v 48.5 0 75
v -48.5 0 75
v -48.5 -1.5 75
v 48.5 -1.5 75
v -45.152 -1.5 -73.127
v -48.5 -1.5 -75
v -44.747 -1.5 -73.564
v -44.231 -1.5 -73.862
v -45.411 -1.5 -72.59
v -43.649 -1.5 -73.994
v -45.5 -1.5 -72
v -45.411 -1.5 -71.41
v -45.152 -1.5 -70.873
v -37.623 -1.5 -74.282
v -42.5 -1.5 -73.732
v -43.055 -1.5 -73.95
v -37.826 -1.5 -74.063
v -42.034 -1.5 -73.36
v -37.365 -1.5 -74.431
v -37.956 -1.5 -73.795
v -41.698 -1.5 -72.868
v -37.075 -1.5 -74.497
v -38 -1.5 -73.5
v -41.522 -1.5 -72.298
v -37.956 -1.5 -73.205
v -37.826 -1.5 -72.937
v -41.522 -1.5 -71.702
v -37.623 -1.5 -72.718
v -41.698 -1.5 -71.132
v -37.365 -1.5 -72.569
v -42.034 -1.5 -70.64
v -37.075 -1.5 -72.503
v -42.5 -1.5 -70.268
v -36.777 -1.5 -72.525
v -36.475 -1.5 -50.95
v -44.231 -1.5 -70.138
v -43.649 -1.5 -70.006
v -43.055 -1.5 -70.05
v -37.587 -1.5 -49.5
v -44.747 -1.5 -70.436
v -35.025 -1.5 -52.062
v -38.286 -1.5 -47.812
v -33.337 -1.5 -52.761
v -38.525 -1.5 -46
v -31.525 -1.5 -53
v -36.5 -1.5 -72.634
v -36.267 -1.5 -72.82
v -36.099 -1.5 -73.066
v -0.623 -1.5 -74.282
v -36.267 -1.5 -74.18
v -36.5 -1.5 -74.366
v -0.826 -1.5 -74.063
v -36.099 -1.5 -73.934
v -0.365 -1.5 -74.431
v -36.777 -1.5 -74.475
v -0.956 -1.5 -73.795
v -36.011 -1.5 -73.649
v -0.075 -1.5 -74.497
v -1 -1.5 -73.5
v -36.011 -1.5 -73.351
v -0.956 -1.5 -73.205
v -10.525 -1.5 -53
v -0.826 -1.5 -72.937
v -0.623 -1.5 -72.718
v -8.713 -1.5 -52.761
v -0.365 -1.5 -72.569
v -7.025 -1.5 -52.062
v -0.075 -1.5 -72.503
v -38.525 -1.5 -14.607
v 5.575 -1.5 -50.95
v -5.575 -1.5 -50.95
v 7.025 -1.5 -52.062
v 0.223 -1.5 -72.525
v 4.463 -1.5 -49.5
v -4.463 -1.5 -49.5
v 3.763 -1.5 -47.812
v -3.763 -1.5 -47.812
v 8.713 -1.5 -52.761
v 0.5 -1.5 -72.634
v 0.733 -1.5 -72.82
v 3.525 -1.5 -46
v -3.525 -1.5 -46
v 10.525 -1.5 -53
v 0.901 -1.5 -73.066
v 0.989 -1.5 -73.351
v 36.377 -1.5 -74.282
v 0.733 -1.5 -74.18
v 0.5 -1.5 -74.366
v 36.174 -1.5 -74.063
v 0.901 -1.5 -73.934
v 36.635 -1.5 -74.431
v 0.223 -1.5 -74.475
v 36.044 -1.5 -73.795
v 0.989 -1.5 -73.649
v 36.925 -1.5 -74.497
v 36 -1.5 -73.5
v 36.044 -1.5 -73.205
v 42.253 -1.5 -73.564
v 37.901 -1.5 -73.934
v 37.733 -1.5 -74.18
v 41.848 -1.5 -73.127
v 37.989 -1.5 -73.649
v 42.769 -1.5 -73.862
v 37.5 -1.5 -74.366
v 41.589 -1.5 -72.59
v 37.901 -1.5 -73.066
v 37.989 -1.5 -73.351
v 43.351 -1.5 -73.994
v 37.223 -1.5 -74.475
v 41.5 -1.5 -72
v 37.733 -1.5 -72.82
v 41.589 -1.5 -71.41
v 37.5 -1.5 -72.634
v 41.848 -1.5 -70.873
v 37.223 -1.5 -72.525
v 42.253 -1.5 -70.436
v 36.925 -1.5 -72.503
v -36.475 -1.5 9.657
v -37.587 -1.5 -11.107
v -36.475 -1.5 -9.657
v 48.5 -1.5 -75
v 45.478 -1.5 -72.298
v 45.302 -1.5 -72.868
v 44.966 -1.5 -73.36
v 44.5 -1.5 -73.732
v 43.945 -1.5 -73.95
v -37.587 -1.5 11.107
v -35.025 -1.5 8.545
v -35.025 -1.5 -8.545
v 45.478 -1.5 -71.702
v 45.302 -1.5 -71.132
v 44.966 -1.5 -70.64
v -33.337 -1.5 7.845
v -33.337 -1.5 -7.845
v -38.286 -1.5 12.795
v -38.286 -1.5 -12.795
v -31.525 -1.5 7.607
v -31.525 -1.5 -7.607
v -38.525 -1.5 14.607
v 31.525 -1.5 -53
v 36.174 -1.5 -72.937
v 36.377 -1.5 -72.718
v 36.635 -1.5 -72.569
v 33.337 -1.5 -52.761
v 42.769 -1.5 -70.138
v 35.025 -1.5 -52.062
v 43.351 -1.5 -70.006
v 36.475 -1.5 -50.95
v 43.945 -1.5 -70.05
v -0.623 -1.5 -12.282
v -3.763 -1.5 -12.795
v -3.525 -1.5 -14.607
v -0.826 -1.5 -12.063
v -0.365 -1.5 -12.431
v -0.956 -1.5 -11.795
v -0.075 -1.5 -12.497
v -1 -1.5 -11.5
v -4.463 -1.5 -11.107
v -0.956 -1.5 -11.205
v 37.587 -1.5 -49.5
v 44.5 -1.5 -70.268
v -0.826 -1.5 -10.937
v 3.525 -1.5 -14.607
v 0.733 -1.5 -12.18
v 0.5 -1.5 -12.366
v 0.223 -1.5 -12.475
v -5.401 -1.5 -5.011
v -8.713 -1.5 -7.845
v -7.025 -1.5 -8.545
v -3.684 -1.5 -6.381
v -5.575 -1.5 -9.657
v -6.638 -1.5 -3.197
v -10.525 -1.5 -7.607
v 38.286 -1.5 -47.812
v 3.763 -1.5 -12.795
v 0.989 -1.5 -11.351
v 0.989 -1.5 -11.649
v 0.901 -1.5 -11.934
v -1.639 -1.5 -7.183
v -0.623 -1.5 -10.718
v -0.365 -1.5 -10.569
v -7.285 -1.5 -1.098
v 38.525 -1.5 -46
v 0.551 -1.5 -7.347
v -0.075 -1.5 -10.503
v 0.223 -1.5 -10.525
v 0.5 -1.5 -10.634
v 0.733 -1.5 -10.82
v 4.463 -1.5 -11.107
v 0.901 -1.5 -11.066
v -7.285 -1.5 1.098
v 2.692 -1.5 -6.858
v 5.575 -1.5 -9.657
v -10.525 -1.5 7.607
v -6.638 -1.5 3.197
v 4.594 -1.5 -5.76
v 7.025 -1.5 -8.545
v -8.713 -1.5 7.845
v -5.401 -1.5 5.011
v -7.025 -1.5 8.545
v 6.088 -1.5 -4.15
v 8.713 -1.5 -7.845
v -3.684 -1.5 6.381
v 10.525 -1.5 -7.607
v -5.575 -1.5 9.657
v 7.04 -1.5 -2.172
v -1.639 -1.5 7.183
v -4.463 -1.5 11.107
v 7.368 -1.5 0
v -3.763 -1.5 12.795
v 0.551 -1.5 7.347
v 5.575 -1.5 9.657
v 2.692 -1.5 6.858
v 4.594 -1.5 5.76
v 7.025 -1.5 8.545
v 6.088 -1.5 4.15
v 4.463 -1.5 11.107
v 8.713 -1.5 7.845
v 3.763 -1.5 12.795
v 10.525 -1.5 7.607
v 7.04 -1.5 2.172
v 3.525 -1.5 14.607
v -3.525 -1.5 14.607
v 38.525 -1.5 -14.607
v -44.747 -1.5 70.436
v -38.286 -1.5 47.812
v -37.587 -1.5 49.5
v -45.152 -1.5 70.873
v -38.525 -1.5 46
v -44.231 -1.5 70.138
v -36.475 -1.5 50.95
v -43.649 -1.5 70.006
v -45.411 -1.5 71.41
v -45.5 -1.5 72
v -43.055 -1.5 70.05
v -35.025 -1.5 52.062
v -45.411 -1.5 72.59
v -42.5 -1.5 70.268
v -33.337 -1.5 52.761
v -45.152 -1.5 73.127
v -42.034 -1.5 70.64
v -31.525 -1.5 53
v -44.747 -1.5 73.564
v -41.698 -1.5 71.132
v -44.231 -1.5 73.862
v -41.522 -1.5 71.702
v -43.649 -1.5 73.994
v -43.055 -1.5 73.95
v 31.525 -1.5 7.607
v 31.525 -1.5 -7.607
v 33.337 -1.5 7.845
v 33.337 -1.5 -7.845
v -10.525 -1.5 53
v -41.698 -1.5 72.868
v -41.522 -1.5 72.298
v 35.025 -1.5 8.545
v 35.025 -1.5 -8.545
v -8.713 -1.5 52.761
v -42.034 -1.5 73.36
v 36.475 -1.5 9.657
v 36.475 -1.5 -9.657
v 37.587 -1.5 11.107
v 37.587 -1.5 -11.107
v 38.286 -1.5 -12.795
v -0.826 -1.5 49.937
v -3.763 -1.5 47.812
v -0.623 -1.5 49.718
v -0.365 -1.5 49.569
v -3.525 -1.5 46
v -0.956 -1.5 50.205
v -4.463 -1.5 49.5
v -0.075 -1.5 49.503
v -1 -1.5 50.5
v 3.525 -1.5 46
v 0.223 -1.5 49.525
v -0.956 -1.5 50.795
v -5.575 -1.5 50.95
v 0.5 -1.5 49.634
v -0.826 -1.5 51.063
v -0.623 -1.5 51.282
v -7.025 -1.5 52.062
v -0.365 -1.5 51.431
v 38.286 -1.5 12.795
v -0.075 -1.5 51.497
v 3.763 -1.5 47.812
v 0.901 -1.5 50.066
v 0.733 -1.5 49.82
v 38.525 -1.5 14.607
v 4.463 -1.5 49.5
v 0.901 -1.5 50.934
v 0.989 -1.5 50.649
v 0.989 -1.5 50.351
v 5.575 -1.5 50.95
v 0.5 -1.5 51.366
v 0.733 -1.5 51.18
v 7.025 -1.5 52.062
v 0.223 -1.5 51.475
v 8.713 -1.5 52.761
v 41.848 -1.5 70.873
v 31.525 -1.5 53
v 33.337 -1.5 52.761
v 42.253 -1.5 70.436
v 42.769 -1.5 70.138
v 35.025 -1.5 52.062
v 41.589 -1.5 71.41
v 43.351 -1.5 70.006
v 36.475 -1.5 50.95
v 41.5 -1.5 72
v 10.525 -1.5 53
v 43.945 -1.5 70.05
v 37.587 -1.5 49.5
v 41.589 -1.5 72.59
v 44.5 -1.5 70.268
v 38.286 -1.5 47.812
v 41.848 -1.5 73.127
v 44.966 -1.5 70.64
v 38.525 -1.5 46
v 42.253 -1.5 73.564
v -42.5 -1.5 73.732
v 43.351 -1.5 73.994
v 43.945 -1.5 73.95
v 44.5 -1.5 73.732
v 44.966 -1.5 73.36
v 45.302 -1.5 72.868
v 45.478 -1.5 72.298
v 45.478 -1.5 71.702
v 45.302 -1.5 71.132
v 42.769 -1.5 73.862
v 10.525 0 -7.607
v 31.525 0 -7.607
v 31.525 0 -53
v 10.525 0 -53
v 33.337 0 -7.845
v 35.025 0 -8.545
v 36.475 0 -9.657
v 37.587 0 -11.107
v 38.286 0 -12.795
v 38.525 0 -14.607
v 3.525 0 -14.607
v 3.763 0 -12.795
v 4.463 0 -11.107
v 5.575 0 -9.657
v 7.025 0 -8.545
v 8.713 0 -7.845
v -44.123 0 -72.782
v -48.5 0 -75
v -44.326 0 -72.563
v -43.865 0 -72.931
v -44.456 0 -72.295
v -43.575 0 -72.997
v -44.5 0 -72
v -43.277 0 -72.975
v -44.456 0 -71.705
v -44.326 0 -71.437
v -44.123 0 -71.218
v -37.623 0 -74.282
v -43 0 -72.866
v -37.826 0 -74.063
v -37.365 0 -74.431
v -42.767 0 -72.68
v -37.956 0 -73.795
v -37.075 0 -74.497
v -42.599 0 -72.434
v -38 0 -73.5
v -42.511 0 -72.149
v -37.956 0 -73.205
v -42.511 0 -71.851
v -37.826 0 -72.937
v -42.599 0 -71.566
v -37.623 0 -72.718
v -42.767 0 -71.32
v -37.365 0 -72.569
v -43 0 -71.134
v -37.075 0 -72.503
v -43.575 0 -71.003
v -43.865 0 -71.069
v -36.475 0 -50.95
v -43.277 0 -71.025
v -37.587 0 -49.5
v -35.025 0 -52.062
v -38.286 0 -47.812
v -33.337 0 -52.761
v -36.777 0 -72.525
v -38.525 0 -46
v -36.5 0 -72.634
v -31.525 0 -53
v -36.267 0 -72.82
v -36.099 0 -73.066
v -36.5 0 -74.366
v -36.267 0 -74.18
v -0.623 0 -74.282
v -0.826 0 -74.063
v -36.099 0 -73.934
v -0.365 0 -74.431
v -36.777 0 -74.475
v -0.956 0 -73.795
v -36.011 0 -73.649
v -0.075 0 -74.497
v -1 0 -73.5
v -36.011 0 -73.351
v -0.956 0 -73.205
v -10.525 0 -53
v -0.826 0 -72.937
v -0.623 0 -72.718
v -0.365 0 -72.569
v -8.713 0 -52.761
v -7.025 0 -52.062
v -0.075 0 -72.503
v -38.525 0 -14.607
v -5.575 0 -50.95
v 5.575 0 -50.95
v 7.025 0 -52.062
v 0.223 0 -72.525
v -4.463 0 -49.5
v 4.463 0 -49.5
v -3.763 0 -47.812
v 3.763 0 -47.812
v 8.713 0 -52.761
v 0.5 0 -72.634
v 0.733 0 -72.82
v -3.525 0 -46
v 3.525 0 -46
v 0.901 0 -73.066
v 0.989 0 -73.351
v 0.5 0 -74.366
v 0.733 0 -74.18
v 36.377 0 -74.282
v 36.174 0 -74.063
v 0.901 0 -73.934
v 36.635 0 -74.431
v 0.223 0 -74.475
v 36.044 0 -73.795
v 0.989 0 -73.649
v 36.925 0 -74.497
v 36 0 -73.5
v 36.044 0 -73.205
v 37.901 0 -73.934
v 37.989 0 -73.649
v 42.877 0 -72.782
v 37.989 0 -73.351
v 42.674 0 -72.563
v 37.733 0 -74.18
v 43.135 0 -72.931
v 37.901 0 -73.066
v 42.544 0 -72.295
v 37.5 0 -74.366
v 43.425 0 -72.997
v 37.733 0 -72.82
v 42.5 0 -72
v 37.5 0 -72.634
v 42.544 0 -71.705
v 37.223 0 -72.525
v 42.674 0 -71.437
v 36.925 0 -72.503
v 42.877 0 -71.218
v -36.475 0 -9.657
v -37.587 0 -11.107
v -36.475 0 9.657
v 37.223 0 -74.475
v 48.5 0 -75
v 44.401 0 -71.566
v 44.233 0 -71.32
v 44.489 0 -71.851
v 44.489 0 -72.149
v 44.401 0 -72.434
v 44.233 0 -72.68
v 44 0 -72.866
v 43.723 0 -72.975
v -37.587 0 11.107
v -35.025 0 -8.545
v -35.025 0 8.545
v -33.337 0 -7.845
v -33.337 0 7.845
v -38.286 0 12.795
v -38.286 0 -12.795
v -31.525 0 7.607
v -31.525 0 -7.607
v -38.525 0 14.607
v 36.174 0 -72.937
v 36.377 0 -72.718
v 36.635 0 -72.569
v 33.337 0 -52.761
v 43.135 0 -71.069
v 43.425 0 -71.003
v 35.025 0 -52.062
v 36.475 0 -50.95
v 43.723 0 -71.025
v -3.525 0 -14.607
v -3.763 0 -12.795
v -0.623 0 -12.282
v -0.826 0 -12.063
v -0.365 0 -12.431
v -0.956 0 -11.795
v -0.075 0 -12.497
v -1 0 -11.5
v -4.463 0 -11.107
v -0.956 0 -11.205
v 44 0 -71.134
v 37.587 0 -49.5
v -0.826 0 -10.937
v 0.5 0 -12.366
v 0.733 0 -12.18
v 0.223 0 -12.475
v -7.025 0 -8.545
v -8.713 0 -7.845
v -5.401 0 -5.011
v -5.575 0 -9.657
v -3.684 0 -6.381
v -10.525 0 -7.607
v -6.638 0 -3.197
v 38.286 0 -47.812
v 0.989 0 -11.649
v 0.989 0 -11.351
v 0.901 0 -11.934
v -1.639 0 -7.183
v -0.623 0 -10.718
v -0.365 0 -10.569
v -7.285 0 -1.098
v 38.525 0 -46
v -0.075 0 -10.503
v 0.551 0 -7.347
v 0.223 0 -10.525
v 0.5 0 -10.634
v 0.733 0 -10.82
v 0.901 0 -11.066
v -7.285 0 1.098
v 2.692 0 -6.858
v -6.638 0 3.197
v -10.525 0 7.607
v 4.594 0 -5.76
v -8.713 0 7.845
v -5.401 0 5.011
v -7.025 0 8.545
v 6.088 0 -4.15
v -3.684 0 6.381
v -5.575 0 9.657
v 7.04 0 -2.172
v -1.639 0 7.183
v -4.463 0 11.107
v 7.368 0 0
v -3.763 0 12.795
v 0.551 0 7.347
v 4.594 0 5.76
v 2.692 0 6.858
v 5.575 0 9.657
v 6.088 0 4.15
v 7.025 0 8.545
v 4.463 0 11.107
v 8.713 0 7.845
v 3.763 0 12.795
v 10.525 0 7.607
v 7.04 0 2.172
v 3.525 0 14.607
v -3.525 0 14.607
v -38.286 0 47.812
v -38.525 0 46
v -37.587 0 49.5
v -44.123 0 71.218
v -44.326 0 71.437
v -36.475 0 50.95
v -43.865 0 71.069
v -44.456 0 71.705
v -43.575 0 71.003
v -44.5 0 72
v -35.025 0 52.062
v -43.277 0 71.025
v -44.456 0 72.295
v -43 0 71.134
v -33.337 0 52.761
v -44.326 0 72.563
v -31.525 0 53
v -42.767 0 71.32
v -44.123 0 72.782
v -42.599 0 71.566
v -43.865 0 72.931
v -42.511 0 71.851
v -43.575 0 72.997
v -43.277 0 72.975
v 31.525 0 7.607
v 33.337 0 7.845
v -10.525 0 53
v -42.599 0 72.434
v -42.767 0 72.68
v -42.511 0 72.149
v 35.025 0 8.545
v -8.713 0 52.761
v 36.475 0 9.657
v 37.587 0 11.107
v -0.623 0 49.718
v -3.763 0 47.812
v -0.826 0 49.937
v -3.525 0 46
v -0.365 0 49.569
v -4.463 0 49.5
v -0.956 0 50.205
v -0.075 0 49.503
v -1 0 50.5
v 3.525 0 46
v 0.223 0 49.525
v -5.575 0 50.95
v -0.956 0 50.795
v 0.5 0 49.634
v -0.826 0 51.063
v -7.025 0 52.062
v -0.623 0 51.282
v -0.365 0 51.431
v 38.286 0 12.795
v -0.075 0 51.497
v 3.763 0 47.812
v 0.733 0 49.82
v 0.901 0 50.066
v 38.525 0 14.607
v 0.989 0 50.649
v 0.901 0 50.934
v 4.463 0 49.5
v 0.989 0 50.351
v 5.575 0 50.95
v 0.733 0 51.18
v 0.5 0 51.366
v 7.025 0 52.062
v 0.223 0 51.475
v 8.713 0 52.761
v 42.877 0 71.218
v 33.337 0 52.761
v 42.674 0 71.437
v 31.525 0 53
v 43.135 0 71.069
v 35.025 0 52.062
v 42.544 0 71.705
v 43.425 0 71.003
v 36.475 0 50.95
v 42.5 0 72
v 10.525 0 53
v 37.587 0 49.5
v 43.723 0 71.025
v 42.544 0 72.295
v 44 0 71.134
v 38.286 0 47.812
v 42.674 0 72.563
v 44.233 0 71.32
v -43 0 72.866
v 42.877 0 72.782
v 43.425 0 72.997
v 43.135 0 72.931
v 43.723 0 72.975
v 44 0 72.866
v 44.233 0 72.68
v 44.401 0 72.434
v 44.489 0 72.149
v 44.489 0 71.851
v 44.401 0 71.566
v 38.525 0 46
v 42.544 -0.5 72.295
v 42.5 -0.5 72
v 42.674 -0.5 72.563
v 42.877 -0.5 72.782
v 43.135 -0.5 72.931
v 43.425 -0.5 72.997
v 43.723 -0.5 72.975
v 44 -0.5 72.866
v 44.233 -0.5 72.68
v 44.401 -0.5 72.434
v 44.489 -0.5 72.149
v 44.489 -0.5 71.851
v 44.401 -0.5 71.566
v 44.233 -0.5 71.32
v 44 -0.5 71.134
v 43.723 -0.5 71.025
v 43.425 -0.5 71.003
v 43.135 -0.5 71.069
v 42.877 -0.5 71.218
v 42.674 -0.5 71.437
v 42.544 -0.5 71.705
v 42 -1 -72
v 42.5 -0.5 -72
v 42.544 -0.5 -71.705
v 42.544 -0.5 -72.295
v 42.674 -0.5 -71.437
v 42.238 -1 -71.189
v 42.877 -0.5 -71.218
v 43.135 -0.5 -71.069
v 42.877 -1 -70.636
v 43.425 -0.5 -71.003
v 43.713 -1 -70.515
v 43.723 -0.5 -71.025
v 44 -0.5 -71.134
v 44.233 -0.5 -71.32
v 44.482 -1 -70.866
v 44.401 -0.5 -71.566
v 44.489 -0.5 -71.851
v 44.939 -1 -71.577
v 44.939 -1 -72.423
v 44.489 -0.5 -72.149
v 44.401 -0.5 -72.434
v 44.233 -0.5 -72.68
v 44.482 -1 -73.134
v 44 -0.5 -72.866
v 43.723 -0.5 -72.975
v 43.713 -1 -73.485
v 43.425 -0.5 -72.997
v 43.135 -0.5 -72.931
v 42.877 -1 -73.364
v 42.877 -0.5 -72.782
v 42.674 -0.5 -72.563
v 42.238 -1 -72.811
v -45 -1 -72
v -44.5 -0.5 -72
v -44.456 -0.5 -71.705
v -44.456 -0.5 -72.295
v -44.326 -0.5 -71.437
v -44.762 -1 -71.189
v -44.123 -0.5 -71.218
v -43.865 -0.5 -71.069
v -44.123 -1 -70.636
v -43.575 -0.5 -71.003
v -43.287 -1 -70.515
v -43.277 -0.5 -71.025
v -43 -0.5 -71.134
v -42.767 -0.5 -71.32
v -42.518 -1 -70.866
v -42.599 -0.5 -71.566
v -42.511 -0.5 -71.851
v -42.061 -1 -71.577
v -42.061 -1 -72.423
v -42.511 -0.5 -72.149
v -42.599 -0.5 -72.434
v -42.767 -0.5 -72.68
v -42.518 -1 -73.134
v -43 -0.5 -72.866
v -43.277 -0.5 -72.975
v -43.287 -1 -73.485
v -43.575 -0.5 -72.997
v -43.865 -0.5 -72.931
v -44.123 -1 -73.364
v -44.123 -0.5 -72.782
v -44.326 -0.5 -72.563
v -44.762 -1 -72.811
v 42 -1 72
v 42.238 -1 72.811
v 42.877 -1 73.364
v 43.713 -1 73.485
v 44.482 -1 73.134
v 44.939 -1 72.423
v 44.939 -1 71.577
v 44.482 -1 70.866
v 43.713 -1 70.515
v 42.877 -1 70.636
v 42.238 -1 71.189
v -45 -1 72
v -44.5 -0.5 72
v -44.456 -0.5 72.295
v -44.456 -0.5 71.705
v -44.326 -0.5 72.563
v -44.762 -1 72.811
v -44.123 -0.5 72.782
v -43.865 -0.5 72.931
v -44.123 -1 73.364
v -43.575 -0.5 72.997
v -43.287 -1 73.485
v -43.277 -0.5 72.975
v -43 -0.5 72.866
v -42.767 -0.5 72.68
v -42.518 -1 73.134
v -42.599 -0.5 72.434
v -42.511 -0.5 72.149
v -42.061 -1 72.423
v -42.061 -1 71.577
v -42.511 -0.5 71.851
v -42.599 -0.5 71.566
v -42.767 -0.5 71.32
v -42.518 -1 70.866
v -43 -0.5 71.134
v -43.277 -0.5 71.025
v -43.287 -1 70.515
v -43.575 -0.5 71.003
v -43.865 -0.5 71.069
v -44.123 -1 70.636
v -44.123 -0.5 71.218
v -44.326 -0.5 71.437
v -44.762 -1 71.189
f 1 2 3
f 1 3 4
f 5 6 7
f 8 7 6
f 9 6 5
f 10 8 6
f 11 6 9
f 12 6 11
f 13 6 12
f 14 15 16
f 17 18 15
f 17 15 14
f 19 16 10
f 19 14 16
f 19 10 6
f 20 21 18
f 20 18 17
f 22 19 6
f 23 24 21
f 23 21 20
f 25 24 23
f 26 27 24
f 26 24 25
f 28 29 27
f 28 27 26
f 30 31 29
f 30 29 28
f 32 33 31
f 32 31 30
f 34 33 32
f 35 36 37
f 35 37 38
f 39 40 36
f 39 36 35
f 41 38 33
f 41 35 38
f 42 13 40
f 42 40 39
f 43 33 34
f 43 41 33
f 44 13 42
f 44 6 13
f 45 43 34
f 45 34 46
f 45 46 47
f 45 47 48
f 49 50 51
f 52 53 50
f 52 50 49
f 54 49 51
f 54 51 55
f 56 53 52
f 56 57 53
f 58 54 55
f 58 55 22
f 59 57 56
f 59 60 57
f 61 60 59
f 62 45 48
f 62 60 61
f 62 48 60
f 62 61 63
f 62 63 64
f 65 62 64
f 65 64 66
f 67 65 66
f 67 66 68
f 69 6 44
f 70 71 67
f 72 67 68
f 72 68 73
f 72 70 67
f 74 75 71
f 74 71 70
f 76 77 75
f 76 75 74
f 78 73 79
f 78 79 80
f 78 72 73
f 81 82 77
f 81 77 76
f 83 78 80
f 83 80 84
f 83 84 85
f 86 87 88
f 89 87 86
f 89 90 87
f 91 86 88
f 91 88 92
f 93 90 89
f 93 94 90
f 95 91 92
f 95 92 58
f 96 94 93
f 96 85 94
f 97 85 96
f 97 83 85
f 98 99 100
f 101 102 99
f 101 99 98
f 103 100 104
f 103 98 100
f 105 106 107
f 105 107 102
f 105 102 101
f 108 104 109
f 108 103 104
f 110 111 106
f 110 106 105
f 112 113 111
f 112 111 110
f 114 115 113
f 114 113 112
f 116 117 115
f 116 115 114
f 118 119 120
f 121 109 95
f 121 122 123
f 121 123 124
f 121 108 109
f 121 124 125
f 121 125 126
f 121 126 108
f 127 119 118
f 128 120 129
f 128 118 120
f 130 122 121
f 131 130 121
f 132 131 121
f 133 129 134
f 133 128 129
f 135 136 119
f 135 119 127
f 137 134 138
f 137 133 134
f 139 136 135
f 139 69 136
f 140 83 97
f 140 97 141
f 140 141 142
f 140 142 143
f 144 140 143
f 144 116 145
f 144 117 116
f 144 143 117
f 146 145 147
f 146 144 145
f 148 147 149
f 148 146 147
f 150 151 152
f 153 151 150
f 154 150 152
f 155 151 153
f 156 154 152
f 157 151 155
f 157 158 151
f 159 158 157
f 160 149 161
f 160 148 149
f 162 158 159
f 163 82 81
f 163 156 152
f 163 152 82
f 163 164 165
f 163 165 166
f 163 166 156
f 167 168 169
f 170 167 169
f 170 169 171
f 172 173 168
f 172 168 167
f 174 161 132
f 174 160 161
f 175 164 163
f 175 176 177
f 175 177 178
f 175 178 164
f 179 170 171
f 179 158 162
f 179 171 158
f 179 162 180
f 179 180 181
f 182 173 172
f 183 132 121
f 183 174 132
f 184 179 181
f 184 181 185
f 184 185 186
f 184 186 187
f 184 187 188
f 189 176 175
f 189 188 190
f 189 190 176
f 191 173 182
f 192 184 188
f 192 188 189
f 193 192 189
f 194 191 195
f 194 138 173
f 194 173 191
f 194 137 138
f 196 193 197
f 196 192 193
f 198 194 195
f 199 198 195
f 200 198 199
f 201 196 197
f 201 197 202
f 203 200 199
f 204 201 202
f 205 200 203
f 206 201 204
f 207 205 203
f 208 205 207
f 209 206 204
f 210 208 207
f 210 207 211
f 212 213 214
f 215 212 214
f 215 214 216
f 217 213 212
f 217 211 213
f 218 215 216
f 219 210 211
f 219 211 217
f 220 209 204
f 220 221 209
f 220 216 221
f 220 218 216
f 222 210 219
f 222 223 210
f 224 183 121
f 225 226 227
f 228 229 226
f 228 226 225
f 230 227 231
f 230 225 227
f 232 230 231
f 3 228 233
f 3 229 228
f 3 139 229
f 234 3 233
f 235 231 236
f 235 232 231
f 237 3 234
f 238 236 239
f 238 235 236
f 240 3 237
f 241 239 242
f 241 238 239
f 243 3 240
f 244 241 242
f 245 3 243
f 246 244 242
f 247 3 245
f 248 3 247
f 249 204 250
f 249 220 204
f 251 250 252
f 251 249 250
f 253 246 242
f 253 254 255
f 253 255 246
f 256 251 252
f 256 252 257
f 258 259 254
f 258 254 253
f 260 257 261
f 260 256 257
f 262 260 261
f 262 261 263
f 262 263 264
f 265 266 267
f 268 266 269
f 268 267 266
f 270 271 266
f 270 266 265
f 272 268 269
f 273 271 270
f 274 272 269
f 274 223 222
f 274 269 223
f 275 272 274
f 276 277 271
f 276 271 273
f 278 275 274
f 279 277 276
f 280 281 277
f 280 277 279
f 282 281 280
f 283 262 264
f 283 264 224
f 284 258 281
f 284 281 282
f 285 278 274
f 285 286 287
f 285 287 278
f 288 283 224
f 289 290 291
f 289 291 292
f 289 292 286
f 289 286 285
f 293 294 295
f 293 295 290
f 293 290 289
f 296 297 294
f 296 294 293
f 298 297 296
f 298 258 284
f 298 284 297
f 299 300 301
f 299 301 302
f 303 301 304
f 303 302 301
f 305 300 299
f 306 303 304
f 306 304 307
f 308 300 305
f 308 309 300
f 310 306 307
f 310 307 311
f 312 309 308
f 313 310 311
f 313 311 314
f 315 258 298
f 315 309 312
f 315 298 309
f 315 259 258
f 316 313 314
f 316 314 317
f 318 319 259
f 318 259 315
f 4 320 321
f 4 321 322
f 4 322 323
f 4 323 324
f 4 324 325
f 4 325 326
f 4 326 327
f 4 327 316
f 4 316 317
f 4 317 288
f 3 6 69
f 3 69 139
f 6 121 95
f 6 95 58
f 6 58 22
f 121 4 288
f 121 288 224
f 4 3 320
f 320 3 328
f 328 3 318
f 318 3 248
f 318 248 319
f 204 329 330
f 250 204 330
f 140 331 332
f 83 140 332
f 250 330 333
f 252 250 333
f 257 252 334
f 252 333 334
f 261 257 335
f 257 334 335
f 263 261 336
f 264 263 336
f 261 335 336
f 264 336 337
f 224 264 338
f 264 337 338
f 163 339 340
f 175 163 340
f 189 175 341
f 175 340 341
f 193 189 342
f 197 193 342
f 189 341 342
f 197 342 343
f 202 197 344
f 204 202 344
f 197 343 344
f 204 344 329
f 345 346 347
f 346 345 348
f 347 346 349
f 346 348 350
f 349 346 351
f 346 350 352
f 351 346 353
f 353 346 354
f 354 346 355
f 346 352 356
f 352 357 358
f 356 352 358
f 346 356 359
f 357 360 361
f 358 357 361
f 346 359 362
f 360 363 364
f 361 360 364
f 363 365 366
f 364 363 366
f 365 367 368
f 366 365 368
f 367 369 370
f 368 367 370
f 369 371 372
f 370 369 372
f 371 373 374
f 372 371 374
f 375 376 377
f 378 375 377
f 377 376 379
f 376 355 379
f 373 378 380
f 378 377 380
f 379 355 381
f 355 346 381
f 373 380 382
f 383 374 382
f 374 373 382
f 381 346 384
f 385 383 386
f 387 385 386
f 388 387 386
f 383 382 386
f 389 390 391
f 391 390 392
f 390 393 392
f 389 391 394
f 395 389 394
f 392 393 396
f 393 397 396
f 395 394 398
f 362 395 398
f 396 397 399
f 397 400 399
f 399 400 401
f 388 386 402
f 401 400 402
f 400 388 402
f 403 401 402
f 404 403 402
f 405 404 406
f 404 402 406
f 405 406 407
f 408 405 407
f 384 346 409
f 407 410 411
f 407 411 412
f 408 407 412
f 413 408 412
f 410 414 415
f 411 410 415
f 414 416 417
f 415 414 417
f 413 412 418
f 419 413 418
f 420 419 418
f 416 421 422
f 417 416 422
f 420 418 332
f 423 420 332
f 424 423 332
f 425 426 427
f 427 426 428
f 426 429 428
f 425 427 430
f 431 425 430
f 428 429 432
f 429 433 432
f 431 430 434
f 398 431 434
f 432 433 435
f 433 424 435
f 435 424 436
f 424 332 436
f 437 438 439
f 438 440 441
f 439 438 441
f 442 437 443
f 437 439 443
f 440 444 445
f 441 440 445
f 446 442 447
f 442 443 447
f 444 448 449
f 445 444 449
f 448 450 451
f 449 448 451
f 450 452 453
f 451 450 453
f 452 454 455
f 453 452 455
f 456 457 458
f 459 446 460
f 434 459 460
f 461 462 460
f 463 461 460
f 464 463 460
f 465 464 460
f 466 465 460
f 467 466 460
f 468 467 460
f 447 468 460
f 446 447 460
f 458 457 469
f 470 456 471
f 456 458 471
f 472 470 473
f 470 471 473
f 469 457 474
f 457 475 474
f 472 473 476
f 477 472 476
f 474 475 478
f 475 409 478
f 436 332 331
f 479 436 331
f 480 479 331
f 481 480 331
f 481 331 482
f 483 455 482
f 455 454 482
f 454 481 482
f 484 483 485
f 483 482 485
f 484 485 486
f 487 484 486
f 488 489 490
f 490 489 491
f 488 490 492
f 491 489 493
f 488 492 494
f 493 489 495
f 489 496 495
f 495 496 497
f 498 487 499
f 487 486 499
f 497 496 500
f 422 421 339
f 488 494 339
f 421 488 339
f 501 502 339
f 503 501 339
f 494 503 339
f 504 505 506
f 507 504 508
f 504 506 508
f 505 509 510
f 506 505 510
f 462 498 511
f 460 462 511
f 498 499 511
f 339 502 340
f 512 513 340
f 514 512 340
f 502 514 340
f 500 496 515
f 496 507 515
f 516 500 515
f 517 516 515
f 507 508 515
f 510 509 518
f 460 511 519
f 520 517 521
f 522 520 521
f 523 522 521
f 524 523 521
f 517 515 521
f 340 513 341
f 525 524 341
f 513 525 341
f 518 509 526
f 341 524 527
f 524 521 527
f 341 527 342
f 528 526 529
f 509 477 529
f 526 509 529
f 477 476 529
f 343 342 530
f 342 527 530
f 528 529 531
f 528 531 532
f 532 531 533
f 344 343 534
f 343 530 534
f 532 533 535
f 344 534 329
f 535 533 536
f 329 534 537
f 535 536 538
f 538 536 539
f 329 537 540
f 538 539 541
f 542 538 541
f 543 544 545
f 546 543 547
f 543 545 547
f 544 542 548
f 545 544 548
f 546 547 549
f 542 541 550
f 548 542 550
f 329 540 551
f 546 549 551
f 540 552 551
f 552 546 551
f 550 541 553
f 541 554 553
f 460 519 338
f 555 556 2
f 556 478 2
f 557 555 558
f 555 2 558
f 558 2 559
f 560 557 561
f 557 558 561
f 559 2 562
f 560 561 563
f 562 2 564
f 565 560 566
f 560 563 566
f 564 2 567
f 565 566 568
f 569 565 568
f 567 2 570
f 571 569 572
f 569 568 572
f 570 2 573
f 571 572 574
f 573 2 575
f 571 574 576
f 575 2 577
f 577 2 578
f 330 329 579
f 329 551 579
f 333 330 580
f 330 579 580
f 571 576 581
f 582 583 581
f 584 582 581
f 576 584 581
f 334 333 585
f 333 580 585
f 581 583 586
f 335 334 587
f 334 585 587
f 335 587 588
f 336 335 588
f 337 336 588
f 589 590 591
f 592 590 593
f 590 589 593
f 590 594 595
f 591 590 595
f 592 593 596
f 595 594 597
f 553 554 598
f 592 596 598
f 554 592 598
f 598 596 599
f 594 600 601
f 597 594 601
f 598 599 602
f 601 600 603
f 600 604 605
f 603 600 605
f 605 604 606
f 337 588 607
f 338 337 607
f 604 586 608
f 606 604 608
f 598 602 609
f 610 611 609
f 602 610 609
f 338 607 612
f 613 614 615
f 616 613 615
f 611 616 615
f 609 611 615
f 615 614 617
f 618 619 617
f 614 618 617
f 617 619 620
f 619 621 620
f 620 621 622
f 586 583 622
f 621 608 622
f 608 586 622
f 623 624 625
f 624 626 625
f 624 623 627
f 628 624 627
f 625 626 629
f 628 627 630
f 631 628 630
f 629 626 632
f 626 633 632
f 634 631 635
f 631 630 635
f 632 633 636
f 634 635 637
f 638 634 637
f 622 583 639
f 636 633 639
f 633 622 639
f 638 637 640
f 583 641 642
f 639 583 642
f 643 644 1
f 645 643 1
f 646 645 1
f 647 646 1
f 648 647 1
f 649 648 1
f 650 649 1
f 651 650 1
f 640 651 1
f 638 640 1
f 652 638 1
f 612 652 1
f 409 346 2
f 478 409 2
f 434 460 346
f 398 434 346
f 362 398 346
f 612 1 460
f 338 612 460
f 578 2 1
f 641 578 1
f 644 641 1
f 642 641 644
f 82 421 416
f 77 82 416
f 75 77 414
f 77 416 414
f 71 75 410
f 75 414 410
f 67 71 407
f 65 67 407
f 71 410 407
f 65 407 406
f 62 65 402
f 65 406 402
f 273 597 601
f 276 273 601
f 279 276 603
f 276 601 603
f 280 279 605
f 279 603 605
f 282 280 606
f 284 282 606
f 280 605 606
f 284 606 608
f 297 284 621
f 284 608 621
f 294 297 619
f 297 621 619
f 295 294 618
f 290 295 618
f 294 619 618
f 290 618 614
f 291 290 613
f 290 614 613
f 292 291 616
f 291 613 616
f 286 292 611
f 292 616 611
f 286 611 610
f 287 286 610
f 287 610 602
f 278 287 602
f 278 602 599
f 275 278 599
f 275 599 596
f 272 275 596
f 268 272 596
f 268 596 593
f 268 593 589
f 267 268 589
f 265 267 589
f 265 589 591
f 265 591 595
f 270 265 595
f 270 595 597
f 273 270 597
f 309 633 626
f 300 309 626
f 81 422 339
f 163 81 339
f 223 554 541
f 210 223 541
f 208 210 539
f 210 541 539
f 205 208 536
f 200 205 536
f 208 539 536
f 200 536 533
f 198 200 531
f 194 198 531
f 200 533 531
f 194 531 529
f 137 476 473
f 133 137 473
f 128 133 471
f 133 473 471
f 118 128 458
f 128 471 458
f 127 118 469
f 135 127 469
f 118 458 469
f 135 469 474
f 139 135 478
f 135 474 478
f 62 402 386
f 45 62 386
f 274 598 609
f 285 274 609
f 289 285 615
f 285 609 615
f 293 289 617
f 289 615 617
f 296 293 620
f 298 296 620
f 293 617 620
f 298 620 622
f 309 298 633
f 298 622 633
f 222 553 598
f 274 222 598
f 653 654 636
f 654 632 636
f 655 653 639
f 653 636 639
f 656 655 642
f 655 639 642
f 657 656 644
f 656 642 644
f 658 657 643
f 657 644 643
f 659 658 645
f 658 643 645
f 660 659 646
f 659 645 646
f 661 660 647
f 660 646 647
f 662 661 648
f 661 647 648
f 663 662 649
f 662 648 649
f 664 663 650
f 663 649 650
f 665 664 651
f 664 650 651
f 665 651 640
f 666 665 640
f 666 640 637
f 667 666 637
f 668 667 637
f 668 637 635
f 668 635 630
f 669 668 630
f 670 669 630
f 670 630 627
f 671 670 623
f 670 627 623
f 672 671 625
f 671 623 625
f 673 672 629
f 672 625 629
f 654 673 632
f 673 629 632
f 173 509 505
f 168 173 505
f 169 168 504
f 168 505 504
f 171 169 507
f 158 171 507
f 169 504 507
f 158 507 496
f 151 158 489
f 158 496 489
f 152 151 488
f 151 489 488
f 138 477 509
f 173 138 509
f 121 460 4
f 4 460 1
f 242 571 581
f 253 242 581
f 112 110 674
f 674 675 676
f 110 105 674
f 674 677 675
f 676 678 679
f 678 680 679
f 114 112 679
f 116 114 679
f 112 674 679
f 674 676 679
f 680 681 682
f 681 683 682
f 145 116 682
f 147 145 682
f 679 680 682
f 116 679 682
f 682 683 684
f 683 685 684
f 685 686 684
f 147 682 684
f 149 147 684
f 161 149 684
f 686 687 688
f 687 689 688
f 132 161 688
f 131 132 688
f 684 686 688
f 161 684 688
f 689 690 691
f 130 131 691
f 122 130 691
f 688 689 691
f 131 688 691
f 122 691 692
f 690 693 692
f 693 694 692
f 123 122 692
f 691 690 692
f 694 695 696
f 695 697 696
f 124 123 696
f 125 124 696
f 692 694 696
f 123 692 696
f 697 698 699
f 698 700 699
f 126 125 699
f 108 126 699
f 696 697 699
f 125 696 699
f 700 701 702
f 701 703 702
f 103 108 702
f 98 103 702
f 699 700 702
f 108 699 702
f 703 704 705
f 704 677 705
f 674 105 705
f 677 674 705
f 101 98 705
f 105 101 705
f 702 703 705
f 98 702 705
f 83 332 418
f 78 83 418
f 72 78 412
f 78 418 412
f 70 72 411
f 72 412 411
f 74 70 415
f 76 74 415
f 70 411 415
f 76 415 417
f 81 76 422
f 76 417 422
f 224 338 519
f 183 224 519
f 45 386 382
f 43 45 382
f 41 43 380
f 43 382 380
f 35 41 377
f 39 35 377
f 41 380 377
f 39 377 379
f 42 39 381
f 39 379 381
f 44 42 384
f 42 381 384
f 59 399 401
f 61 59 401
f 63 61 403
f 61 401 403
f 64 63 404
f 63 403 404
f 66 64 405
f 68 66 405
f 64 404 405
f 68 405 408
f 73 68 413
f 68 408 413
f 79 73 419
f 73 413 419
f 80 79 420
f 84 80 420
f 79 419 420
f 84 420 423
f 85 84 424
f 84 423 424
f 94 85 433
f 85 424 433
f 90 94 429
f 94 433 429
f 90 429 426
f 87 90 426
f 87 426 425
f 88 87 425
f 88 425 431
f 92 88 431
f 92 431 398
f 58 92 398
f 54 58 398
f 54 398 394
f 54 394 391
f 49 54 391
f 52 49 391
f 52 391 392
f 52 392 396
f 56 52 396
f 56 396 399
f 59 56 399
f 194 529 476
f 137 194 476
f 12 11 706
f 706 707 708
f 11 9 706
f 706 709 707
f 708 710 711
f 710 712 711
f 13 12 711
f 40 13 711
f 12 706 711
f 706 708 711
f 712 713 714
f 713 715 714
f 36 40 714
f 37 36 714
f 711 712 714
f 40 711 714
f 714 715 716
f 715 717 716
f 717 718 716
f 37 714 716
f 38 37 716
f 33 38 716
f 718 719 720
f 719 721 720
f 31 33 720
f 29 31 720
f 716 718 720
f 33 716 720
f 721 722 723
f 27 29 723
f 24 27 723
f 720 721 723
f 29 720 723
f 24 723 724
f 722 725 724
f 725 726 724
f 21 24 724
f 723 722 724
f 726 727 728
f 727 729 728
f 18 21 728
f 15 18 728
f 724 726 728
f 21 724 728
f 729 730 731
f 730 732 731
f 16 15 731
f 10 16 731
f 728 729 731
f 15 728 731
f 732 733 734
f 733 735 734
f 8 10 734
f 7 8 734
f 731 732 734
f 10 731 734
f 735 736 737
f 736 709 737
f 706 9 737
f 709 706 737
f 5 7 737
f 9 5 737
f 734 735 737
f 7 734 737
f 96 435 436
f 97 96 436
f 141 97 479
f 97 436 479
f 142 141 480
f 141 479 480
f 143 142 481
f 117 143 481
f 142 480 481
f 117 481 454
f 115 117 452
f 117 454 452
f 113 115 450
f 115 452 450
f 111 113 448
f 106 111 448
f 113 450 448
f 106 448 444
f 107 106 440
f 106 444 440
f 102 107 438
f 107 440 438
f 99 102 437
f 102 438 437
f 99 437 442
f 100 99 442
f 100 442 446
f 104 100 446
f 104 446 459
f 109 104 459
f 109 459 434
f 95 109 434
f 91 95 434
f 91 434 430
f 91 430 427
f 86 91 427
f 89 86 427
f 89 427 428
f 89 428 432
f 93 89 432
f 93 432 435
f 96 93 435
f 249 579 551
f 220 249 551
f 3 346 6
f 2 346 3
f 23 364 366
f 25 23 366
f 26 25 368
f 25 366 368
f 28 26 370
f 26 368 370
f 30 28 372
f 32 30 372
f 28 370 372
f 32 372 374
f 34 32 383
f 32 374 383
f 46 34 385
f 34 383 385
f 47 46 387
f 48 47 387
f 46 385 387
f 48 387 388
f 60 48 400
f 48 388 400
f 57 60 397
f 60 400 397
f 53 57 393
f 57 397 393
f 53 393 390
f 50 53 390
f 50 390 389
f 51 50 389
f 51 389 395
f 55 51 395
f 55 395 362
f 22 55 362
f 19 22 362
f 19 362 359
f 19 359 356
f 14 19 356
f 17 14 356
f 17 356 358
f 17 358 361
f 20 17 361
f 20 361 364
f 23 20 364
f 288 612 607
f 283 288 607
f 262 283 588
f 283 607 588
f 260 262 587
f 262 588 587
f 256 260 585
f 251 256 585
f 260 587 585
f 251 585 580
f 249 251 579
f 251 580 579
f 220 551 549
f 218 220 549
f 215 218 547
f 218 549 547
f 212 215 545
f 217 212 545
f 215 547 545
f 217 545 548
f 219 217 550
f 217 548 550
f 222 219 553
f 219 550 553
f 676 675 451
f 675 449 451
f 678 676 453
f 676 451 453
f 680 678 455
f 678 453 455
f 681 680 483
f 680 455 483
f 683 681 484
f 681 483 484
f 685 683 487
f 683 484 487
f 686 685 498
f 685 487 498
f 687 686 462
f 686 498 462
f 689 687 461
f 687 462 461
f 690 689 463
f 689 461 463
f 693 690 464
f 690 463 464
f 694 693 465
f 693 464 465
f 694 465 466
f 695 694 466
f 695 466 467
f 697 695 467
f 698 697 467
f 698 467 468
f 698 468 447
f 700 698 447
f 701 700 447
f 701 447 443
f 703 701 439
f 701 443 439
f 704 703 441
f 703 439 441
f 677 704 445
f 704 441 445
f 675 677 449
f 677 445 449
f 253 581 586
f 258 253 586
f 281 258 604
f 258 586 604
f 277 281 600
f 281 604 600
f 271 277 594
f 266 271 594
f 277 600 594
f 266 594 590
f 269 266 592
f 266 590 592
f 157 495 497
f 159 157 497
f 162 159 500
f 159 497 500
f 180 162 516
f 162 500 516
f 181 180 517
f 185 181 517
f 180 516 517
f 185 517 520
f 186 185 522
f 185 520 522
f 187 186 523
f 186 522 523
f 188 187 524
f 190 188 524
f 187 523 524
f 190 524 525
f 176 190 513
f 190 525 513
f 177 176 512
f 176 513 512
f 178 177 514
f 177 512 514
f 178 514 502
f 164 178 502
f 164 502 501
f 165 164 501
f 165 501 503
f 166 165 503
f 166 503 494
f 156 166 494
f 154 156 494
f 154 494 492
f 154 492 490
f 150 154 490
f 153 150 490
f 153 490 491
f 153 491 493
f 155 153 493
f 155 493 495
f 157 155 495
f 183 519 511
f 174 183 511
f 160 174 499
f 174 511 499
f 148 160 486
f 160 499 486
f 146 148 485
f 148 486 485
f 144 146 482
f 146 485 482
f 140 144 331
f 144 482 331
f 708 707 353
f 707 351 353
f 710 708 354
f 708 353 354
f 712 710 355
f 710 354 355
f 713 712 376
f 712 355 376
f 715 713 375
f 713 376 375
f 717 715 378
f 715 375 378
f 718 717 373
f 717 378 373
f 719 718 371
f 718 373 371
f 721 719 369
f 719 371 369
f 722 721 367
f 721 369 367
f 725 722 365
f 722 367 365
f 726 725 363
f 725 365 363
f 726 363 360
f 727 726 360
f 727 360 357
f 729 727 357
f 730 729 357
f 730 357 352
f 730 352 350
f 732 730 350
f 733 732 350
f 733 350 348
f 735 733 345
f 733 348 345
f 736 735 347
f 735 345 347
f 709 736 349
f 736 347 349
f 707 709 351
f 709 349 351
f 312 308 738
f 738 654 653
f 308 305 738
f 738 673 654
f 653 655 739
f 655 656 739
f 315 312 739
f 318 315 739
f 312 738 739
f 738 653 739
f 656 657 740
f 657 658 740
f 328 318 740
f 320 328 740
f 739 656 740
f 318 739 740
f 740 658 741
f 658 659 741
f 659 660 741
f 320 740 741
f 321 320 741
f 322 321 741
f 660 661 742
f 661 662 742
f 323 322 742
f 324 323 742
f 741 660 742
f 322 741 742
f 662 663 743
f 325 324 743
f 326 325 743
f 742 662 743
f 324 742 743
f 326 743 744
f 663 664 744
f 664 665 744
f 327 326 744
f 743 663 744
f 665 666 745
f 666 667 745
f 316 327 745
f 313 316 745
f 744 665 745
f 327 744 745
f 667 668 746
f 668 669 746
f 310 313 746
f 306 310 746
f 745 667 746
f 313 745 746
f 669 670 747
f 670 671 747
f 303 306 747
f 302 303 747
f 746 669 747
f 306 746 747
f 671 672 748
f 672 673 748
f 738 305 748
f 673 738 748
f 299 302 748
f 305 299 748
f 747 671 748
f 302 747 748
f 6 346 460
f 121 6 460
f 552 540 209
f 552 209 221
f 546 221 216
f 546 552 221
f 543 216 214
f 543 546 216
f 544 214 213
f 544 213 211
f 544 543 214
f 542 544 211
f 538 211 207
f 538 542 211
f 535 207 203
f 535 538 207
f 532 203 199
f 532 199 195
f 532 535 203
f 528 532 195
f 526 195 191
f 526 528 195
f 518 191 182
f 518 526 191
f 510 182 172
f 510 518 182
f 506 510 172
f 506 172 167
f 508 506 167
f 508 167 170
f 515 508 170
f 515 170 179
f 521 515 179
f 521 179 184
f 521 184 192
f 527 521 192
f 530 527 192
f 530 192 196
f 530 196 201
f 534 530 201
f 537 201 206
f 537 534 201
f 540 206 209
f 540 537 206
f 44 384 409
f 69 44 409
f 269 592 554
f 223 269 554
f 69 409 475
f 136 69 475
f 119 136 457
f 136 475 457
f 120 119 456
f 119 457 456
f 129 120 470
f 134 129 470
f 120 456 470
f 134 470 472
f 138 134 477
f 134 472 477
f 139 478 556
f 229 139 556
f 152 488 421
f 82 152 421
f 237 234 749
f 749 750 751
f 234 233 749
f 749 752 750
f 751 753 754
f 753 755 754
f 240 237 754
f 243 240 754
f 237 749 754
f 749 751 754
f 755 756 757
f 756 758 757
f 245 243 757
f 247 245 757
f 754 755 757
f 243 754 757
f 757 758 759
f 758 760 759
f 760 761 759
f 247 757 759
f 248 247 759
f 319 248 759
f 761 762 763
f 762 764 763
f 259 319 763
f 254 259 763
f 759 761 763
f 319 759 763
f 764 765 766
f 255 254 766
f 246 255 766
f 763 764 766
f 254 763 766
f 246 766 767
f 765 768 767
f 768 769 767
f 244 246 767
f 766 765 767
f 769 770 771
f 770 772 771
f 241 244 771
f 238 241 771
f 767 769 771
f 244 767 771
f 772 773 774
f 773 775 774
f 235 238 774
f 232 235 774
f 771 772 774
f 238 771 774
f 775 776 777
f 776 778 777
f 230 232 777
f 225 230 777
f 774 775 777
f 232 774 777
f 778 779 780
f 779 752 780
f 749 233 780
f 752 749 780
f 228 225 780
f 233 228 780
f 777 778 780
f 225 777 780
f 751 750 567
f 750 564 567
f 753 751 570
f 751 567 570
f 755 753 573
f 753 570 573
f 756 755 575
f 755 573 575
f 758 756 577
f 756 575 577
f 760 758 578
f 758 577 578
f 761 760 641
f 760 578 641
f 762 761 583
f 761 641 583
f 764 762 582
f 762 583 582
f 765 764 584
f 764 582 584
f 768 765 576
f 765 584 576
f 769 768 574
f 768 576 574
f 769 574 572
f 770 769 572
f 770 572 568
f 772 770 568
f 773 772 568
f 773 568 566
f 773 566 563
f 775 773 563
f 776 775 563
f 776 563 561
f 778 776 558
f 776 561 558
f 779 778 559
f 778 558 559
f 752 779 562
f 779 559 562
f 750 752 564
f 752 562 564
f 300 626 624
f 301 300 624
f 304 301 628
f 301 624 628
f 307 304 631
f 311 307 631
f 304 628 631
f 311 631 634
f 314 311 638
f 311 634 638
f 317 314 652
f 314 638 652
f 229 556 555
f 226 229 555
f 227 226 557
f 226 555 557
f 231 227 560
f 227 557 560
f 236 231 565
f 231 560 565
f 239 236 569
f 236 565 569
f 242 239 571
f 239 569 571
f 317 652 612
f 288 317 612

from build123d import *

# Parameters (mm, degrees)
F0_W           = 97
F0_H           = 150
F0_R           = 7.367785
F1_DEPTH       = 1.5
F3_D           = 2
F3_CSINK_D     = 4
F3_CSINK_ANGLE = 90
F5_D           = 2


# Not quite as in the source:
# - a feature names something its author has since deleted; it is built from what else it names


with BuildPart() as f1:
    # F0 (on Front) → F1 (new body)
    with BuildSketch(Plane.XZ):
        Rectangle(F0_W, F0_H)
        with BuildLine():
            Line((-31.5249225795, -7.60684), (-10.5249225795, -7.60684))
            ThreePointArc((-10.5249225795, -7.60684), (-5.5751751112, -9.6570925317), (-3.5249225795, -14.60684))
            Line((-3.5249225795, -14.60684), (-3.5249225795, -46))
            ThreePointArc((-3.5249225795, -46), (-5.5751751112, -50.9497474683), (-10.5249225795, -53))
            Line((-10.5249225795, -53), (-31.5249225795, -53))
            ThreePointArc((-31.5249225795, -53), (-36.4746700478, -50.9497474683), (-38.5249225795, -46))
            Line((-38.5249225795, -46), (-38.5249225795, -14.60684))
            ThreePointArc((-38.5249225795, -14.60684), (-36.4746700478, -9.6570925317), (-31.5249225795, -7.60684))
        make_face(mode=Mode.SUBTRACT)
        with BuildLine():
            ThreePointArc((38.5249225795, -46), (36.4746700478, -50.9497474683), (31.5249225795, -53))
            Line((31.5249225795, -53), (10.5249225795, -53))
            ThreePointArc((10.5249225795, -53), (5.5751751112, -50.9497474683), (3.5249225795, -46))
            Line((3.5249225795, -46), (3.5249225795, -14.60684))
            ThreePointArc((3.5249225795, -14.60684), (5.5751751112, -9.6570925317), (10.5249225795, -7.60684))
            Line((10.5249225795, -7.60684), (31.5249225795, -7.60684))
            ThreePointArc((31.5249225795, -7.60684), (36.4746700478, -9.6570925317), (38.5249225795, -14.60684))
            Line((38.5249225795, -14.60684), (38.5249225795, -46))
        make_face(mode=Mode.SUBTRACT)
        with BuildLine():
            ThreePointArc((-3.5249225795, 14.60684), (-5.5751751112, 9.6570925317), (-10.5249225795, 7.60684))
            Line((-10.5249225795, 7.60684), (-31.5249225795, 7.60684))
            ThreePointArc((-31.5249225795, 7.60684), (-36.4746700478, 9.6570925317), (-38.5249225795, 14.60684))
            Line((-38.5249225795, 14.60684), (-38.5249225795, 46))
            ThreePointArc((-38.5249225795, 46), (-36.4746700478, 50.9497474683), (-31.5249225795, 53))
            Line((-31.5249225795, 53), (-10.5249225795, 53))
            ThreePointArc((-10.5249225795, 53), (-5.5751751112, 50.9497474683), (-3.5249225795, 46))
            Line((-3.5249225795, 46), (-3.5249225795, 14.60684))
        make_face(mode=Mode.SUBTRACT)
        Circle(F0_R, mode=Mode.SUBTRACT)
        with BuildLine():
            ThreePointArc((10.5249225795, 7.60684), (5.5751751112, 9.6570925317), (3.5249225795, 14.60684))
            Line((3.5249225795, 14.60684), (3.5249225795, 46))
            ThreePointArc((3.5249225795, 46), (5.5751751112, 50.9497474683), (10.5249225795, 53))
            Line((10.5249225795, 53), (31.5249225795, 53))
            ThreePointArc((31.5249225795, 53), (36.4746700478, 50.9497474683), (38.5249225795, 46))
            Line((38.5249225795, 46), (38.5249225795, 14.60684))
            ThreePointArc((38.5249225795, 14.60684), (36.4746700478, 9.6570925317), (31.5249225795, 7.60684))
            Line((31.5249225795, 7.60684), (10.5249225795, 7.60684))
        make_face(mode=Mode.SUBTRACT)
    extrude(amount=F1_DEPTH)

    # F3 (through all)
    with Locations(Plane.XZ.offset(1.5)):
        with Locations((-43.5, -72), (43.5, -72), (43.5, 72), (-43.5, 72)):
            CounterSinkHole(F3_D / 2, F3_CSINK_D / 2, counter_sink_angle=F3_CSINK_ANGLE)

    # F5 (through all)
    with Locations(Plane.XZ.offset(1.5)):
        with Locations((-37, -73.5), (0, -73.5), (37, -73.5), (0, -11.5), (0, 50.5)):
            Hole(F5_D / 2)


solid = f1.part
